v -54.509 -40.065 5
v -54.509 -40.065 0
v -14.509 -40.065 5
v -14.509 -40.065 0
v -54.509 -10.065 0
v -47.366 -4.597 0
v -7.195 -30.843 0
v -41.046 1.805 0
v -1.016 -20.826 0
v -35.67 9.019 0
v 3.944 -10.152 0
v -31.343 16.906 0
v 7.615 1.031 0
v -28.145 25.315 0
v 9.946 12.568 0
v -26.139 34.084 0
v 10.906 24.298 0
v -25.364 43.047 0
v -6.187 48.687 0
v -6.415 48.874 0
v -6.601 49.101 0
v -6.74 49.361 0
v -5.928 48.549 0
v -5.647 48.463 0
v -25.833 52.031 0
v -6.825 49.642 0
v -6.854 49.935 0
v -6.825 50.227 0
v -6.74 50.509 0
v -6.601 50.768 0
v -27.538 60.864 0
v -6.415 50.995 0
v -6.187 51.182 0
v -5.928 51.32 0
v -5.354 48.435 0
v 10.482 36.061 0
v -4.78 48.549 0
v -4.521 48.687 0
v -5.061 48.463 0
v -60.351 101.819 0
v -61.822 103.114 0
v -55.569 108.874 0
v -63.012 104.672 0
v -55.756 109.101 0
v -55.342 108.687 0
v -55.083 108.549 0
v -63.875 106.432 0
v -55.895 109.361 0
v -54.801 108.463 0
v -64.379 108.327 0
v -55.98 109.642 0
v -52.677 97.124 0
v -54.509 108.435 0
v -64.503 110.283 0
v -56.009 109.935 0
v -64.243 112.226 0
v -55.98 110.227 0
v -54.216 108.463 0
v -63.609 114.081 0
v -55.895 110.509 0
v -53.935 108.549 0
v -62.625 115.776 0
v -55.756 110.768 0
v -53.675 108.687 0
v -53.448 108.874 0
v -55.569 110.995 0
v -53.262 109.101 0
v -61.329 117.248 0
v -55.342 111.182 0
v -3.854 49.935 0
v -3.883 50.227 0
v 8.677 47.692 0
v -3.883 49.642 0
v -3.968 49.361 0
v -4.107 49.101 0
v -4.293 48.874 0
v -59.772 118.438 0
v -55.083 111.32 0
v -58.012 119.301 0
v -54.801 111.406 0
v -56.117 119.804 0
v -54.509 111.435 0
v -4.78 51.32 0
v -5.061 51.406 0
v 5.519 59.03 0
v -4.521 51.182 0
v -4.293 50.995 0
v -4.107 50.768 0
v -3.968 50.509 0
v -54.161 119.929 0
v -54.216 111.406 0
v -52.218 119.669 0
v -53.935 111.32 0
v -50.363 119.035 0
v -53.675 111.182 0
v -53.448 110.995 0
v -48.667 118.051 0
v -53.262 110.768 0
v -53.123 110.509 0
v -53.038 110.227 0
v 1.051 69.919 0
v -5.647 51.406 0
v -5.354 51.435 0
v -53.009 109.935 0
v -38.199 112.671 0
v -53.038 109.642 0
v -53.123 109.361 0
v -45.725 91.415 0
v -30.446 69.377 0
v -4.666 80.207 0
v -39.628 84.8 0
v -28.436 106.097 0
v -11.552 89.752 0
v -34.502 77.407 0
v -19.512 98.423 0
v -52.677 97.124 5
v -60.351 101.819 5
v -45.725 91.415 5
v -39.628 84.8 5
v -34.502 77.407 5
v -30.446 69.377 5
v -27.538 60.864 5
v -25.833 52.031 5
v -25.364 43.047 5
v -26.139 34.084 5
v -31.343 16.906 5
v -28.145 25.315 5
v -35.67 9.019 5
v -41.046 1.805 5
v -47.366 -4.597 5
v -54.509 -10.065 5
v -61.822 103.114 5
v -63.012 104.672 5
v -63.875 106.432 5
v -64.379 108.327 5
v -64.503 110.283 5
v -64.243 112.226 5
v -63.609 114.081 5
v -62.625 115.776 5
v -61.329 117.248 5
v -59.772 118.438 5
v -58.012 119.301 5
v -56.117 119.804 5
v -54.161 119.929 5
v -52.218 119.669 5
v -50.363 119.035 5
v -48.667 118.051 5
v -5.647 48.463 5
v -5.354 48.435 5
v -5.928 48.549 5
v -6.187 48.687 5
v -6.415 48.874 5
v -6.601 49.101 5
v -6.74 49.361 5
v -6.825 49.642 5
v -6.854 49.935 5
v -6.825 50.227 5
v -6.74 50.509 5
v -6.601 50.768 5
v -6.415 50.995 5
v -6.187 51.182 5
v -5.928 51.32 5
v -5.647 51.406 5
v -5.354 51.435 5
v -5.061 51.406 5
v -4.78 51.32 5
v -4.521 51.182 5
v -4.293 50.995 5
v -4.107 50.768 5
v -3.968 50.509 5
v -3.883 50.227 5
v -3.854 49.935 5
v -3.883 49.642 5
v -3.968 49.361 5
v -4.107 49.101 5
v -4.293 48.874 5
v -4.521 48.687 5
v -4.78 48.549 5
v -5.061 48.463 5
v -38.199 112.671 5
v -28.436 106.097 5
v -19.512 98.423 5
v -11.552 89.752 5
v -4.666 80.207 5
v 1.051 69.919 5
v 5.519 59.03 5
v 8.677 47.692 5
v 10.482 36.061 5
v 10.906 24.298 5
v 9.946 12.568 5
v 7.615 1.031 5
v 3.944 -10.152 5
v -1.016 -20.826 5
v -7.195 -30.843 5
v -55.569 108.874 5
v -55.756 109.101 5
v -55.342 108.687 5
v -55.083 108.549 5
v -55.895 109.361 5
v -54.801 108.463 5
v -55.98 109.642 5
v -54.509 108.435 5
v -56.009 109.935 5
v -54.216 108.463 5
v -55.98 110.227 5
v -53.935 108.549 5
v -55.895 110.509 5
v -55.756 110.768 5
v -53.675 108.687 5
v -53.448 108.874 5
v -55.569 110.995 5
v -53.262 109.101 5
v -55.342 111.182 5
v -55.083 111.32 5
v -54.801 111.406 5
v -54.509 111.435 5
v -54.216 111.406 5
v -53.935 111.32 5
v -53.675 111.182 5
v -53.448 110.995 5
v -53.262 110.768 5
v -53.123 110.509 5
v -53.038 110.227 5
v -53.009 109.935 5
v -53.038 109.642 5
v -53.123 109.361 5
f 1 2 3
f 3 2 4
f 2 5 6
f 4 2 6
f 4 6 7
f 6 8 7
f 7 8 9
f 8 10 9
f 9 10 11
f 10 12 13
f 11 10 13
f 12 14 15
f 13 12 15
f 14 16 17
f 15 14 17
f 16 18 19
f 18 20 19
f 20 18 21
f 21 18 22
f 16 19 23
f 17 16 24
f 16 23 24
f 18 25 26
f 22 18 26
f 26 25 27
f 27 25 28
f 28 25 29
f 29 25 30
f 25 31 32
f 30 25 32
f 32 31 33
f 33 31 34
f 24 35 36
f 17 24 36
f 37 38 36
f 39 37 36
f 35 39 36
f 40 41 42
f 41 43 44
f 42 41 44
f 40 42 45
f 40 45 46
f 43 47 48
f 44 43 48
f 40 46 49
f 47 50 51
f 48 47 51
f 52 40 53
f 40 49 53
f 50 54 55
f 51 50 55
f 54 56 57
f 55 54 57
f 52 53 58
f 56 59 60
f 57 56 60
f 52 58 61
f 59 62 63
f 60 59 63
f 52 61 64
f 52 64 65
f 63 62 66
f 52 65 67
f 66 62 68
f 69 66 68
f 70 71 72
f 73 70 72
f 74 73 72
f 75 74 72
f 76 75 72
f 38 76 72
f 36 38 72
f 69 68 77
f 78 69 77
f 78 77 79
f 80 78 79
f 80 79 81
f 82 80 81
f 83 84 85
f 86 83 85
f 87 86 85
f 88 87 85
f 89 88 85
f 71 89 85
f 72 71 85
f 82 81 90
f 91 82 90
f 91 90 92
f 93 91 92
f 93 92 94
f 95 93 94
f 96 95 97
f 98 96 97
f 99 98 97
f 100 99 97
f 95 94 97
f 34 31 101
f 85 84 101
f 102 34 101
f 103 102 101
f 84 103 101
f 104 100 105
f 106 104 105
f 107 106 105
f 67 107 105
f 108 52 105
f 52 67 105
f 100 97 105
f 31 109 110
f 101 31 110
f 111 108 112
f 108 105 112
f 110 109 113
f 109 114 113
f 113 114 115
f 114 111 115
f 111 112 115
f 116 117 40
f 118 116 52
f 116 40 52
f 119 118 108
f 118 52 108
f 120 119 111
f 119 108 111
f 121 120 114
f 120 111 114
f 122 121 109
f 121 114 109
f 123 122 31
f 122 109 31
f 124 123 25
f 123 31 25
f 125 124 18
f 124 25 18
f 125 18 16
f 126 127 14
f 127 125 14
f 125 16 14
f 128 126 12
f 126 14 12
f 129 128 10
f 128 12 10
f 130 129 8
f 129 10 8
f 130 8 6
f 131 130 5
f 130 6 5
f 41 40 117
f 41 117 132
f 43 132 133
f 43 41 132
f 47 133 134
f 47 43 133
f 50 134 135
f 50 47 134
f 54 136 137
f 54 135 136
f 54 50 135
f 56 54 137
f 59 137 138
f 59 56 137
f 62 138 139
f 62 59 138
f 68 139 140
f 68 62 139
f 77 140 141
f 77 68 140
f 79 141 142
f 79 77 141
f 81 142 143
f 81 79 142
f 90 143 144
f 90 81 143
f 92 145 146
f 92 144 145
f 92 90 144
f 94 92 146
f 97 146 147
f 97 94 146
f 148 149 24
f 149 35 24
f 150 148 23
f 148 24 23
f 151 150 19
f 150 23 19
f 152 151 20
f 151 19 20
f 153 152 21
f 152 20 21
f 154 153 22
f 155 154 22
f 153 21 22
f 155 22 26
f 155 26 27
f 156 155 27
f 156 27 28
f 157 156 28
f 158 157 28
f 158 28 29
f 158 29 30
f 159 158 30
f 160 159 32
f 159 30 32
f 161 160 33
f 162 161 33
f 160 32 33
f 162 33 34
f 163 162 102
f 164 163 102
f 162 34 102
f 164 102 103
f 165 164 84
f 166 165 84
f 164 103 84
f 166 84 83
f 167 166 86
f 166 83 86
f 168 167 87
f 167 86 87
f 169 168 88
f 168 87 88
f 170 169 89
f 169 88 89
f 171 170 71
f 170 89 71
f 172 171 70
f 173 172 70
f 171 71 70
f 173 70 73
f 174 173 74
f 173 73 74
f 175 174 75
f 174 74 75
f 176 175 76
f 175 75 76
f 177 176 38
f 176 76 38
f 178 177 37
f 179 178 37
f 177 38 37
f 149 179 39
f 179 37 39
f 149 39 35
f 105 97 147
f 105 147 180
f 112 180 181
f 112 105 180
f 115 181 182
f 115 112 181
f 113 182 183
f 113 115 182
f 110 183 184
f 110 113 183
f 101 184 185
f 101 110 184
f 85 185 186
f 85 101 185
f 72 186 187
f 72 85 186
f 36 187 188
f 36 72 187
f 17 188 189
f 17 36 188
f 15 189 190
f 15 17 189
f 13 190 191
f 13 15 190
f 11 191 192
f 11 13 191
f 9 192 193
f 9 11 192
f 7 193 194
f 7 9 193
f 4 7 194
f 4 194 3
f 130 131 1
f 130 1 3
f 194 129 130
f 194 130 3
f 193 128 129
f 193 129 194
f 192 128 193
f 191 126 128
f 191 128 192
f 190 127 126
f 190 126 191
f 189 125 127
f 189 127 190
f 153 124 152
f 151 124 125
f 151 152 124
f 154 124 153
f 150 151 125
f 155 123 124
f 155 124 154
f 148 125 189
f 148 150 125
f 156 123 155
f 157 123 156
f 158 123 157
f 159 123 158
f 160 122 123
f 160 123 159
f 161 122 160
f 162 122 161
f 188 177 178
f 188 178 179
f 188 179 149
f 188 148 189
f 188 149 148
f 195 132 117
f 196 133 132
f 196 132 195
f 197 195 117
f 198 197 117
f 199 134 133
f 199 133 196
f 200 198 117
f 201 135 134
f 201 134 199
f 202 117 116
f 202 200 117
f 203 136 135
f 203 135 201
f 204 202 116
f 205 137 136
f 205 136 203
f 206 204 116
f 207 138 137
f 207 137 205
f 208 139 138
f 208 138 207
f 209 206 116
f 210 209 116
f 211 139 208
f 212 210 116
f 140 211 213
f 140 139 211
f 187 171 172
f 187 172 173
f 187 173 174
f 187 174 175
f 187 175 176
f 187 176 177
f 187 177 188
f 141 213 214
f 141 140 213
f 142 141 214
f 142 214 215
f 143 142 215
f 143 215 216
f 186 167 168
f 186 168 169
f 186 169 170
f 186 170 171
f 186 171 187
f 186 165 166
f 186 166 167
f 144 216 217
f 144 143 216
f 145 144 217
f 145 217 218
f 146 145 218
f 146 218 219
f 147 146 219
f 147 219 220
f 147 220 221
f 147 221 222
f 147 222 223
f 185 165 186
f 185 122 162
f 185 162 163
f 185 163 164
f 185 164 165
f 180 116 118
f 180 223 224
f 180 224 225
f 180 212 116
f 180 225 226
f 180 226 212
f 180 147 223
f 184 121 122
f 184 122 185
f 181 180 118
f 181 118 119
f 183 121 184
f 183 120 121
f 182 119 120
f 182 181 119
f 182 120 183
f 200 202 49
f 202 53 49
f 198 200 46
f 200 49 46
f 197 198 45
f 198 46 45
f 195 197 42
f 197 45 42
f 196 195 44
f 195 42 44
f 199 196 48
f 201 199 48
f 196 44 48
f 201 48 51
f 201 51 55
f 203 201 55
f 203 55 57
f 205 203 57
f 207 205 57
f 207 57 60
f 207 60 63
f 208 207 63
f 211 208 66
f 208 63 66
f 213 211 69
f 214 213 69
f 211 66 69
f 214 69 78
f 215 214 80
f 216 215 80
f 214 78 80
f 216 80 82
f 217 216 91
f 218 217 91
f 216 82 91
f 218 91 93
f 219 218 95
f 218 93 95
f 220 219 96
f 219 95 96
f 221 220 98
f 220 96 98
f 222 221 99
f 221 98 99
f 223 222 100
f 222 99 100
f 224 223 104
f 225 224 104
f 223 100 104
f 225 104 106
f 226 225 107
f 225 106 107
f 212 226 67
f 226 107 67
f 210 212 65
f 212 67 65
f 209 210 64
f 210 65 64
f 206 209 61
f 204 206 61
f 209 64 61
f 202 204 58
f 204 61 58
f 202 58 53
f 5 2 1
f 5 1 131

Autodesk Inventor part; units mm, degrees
ref_plane "YZ Plane" through (0, 0, 0) normal (1, 0, 0) x (0, 1, 0)
ref_plane "XZ Plane" through (0, 0, 0) normal (0, 1, 0) x (-1, 0, 0)
ref_plane "XY Plane" through (0, 0, 0) normal (0, 0, 1) x (1, 0, 0)
sketch "Skizze1" plane through (0, 0, 0) normal (0, 0, 1) x (1, 0, 0)
  line L0 (-113.5762, 0) -> (48.979, 0) projected
  line L1 (0, -73.4285) -> (0, 160.1129) projected
  line L2 (-54.5088, -40.0654) -> (-14.5088, -40.0654)
  line L3 (-54.5088, -40.0654) -> (-54.5088, -10.0654)
  circle A0 centre (-54.5088, 109.9346) radius 10
  arc A1 (-14.5088, -40.0654) -> (-48.6674, 118.0511) centre (-89.0676, 26.5753) ccw
  arc A2 (-54.5088, -10.0654) -> (-60.3511, 101.8187) centre (-90.354, 44.1574) ccw
  point P0 (0, 0)
  point P1 (-58.162, 100.6258)
  dimension "d0" = 30
  dimension "d1" = 40
  dimension "d6" = 150
  dimension "d7" = 20
  dimension "d8" = 65
  dimension "d9" = 100
  dimension "d10" = 0
extrude "Extrusion1" add sketch "Skizze1" along normal blind 5 contours A2 A0 A1 L1 L0 | L0 L1 A1 L2 L3 A2 | L1 A1 L0 | L0 A1 L1 | A2 A0 picked at (-52.7779, 112.7657)
sketch "Skizze2" plane through (0, 0, 5) normal (0, 0, 1) x (1, 0, 0)
  arc A0 (-48.6674, 118.0511) -> (-60.3511, 101.8187) centre (-54.5088, 109.9346) ccw projected
  point P0 (0, 0)
  dimension "d13" = 0
  dimension "d14" = 0
hole "Bohrung1" at (-54.5088, 109.9346, 5) direction (0, 0, -1) diameter 3 end through all
sketch "Skizze3" plane through (0, 0, 5) normal (0, 0, 1) x (1, 0, 0)
  line L0 (-54.5088, -40.0654) -> (-14.5088, -40.0654) projected
  arc A0 (-54.5088, -10.0654) -> (-60.3511, 101.8187) centre (-90.354, 44.1574) ccw projected
  point P0 (0, 0)
  point P1 (-5.354, 49.9346)
  dimension "d22" = 90
  dimension "d23" = 85
hole "Bohrung2" at (-5.354, 49.9346, 5) direction (0, 0, -1) diameter 3 end through all
properties part number "Halterung hinten unten" material "Stahl"
